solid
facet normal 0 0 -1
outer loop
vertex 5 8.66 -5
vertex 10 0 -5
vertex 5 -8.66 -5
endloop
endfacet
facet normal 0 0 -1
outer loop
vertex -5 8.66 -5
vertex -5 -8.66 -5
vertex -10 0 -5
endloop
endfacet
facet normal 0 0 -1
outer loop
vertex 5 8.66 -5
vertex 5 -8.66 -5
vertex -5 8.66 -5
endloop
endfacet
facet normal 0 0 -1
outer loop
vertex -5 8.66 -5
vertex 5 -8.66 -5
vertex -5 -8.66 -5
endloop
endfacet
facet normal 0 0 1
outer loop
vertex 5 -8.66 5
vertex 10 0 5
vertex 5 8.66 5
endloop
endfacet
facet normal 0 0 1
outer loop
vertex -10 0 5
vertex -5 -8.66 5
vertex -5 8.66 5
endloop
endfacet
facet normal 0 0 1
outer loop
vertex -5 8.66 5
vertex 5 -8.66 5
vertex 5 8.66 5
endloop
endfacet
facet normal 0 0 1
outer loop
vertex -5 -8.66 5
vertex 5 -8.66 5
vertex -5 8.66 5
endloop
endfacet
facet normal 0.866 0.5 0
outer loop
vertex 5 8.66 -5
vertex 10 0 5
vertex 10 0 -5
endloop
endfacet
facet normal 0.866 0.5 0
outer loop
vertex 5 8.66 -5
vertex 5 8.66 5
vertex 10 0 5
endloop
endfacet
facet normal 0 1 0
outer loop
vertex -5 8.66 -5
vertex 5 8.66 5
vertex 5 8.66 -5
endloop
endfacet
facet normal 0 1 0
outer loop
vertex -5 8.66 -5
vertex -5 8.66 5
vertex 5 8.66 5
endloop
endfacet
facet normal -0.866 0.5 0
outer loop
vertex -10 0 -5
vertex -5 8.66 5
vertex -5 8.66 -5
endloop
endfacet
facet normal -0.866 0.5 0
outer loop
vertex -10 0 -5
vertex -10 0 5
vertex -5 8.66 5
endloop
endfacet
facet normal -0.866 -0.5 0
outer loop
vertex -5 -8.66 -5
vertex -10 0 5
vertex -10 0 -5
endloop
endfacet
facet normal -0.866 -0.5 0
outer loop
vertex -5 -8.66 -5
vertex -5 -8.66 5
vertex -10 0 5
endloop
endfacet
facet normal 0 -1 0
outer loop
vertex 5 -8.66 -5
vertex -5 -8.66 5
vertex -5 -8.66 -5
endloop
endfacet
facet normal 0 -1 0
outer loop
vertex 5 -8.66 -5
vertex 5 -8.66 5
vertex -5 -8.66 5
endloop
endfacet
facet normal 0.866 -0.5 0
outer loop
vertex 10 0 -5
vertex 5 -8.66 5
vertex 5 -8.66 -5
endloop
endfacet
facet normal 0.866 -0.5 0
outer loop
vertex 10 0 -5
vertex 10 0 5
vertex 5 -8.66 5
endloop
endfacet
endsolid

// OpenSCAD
// Created by Matthew Alexander Manuel 2016-03-09
// matt@mattmanuel.com http://www.mattmanuel.com
// The MIT License (MIT)
/* Copyright (c) 2016 Matthew Alexander Manuel

Permission is hereby granted, free of charge, to any person obtaining a copy of this software and associated documentation files (the "Software"), to deal in the Software without restriction, including without limitation the rights to use, copy, modify, merge, publish, distribute, sublicense, and/or sell copies of the Software, and to permit persons to whom the Software is furnished to do so, subject to the following conditions:

The above copyright notice and this permission notice shall be included in all copies or substantial portions of the Software.

THE SOFTWARE IS PROVIDED "AS IS", WITHOUT WARRANTY OF ANY KIND, EXPRESS OR IMPLIED, INCLUDING BUT NOT LIMITED TO THE WARRANTIES OF MERCHANTABILITY, FITNESS FOR A PARTICULAR PURPOSE AND NONINFRINGEMENT. IN NO EVENT SHALL THE AUTHORS OR COPYRIGHT HOLDERS BE LIABLE FOR ANY CLAIM, DAMAGES OR OTHER LIABILITY, WHETHER IN AN ACTION OF CONTRACT, TORT OR OTHERWISE, ARISING FROM, OUT OF OR IN CONNECTION WITH THE SOFTWARE OR THE USE OR OTHER DEALINGS IN THE SOFTWARE.
*/

// size is the XY plane size, height in Z
module hexagon(scaleSize, extrudeHeight) {
    // circumscribed size -- circle radius touching points, not sides
    sin30 = sin(30); // pre-calculate to save CPU cycles a bit (probably not necessary, but a good practice)
    cos30 = cos(30);
    scale([scaleSize,scaleSize,1]) linear_extrude(height = extrudeHeight, center = true) polygon(points = [ [1,0],[sin30,cos30],[-sin30,cos30],[-1,0],[-sin30,-cos30],[sin30,-cos30]] );
        
}

hexagon(10,10);
